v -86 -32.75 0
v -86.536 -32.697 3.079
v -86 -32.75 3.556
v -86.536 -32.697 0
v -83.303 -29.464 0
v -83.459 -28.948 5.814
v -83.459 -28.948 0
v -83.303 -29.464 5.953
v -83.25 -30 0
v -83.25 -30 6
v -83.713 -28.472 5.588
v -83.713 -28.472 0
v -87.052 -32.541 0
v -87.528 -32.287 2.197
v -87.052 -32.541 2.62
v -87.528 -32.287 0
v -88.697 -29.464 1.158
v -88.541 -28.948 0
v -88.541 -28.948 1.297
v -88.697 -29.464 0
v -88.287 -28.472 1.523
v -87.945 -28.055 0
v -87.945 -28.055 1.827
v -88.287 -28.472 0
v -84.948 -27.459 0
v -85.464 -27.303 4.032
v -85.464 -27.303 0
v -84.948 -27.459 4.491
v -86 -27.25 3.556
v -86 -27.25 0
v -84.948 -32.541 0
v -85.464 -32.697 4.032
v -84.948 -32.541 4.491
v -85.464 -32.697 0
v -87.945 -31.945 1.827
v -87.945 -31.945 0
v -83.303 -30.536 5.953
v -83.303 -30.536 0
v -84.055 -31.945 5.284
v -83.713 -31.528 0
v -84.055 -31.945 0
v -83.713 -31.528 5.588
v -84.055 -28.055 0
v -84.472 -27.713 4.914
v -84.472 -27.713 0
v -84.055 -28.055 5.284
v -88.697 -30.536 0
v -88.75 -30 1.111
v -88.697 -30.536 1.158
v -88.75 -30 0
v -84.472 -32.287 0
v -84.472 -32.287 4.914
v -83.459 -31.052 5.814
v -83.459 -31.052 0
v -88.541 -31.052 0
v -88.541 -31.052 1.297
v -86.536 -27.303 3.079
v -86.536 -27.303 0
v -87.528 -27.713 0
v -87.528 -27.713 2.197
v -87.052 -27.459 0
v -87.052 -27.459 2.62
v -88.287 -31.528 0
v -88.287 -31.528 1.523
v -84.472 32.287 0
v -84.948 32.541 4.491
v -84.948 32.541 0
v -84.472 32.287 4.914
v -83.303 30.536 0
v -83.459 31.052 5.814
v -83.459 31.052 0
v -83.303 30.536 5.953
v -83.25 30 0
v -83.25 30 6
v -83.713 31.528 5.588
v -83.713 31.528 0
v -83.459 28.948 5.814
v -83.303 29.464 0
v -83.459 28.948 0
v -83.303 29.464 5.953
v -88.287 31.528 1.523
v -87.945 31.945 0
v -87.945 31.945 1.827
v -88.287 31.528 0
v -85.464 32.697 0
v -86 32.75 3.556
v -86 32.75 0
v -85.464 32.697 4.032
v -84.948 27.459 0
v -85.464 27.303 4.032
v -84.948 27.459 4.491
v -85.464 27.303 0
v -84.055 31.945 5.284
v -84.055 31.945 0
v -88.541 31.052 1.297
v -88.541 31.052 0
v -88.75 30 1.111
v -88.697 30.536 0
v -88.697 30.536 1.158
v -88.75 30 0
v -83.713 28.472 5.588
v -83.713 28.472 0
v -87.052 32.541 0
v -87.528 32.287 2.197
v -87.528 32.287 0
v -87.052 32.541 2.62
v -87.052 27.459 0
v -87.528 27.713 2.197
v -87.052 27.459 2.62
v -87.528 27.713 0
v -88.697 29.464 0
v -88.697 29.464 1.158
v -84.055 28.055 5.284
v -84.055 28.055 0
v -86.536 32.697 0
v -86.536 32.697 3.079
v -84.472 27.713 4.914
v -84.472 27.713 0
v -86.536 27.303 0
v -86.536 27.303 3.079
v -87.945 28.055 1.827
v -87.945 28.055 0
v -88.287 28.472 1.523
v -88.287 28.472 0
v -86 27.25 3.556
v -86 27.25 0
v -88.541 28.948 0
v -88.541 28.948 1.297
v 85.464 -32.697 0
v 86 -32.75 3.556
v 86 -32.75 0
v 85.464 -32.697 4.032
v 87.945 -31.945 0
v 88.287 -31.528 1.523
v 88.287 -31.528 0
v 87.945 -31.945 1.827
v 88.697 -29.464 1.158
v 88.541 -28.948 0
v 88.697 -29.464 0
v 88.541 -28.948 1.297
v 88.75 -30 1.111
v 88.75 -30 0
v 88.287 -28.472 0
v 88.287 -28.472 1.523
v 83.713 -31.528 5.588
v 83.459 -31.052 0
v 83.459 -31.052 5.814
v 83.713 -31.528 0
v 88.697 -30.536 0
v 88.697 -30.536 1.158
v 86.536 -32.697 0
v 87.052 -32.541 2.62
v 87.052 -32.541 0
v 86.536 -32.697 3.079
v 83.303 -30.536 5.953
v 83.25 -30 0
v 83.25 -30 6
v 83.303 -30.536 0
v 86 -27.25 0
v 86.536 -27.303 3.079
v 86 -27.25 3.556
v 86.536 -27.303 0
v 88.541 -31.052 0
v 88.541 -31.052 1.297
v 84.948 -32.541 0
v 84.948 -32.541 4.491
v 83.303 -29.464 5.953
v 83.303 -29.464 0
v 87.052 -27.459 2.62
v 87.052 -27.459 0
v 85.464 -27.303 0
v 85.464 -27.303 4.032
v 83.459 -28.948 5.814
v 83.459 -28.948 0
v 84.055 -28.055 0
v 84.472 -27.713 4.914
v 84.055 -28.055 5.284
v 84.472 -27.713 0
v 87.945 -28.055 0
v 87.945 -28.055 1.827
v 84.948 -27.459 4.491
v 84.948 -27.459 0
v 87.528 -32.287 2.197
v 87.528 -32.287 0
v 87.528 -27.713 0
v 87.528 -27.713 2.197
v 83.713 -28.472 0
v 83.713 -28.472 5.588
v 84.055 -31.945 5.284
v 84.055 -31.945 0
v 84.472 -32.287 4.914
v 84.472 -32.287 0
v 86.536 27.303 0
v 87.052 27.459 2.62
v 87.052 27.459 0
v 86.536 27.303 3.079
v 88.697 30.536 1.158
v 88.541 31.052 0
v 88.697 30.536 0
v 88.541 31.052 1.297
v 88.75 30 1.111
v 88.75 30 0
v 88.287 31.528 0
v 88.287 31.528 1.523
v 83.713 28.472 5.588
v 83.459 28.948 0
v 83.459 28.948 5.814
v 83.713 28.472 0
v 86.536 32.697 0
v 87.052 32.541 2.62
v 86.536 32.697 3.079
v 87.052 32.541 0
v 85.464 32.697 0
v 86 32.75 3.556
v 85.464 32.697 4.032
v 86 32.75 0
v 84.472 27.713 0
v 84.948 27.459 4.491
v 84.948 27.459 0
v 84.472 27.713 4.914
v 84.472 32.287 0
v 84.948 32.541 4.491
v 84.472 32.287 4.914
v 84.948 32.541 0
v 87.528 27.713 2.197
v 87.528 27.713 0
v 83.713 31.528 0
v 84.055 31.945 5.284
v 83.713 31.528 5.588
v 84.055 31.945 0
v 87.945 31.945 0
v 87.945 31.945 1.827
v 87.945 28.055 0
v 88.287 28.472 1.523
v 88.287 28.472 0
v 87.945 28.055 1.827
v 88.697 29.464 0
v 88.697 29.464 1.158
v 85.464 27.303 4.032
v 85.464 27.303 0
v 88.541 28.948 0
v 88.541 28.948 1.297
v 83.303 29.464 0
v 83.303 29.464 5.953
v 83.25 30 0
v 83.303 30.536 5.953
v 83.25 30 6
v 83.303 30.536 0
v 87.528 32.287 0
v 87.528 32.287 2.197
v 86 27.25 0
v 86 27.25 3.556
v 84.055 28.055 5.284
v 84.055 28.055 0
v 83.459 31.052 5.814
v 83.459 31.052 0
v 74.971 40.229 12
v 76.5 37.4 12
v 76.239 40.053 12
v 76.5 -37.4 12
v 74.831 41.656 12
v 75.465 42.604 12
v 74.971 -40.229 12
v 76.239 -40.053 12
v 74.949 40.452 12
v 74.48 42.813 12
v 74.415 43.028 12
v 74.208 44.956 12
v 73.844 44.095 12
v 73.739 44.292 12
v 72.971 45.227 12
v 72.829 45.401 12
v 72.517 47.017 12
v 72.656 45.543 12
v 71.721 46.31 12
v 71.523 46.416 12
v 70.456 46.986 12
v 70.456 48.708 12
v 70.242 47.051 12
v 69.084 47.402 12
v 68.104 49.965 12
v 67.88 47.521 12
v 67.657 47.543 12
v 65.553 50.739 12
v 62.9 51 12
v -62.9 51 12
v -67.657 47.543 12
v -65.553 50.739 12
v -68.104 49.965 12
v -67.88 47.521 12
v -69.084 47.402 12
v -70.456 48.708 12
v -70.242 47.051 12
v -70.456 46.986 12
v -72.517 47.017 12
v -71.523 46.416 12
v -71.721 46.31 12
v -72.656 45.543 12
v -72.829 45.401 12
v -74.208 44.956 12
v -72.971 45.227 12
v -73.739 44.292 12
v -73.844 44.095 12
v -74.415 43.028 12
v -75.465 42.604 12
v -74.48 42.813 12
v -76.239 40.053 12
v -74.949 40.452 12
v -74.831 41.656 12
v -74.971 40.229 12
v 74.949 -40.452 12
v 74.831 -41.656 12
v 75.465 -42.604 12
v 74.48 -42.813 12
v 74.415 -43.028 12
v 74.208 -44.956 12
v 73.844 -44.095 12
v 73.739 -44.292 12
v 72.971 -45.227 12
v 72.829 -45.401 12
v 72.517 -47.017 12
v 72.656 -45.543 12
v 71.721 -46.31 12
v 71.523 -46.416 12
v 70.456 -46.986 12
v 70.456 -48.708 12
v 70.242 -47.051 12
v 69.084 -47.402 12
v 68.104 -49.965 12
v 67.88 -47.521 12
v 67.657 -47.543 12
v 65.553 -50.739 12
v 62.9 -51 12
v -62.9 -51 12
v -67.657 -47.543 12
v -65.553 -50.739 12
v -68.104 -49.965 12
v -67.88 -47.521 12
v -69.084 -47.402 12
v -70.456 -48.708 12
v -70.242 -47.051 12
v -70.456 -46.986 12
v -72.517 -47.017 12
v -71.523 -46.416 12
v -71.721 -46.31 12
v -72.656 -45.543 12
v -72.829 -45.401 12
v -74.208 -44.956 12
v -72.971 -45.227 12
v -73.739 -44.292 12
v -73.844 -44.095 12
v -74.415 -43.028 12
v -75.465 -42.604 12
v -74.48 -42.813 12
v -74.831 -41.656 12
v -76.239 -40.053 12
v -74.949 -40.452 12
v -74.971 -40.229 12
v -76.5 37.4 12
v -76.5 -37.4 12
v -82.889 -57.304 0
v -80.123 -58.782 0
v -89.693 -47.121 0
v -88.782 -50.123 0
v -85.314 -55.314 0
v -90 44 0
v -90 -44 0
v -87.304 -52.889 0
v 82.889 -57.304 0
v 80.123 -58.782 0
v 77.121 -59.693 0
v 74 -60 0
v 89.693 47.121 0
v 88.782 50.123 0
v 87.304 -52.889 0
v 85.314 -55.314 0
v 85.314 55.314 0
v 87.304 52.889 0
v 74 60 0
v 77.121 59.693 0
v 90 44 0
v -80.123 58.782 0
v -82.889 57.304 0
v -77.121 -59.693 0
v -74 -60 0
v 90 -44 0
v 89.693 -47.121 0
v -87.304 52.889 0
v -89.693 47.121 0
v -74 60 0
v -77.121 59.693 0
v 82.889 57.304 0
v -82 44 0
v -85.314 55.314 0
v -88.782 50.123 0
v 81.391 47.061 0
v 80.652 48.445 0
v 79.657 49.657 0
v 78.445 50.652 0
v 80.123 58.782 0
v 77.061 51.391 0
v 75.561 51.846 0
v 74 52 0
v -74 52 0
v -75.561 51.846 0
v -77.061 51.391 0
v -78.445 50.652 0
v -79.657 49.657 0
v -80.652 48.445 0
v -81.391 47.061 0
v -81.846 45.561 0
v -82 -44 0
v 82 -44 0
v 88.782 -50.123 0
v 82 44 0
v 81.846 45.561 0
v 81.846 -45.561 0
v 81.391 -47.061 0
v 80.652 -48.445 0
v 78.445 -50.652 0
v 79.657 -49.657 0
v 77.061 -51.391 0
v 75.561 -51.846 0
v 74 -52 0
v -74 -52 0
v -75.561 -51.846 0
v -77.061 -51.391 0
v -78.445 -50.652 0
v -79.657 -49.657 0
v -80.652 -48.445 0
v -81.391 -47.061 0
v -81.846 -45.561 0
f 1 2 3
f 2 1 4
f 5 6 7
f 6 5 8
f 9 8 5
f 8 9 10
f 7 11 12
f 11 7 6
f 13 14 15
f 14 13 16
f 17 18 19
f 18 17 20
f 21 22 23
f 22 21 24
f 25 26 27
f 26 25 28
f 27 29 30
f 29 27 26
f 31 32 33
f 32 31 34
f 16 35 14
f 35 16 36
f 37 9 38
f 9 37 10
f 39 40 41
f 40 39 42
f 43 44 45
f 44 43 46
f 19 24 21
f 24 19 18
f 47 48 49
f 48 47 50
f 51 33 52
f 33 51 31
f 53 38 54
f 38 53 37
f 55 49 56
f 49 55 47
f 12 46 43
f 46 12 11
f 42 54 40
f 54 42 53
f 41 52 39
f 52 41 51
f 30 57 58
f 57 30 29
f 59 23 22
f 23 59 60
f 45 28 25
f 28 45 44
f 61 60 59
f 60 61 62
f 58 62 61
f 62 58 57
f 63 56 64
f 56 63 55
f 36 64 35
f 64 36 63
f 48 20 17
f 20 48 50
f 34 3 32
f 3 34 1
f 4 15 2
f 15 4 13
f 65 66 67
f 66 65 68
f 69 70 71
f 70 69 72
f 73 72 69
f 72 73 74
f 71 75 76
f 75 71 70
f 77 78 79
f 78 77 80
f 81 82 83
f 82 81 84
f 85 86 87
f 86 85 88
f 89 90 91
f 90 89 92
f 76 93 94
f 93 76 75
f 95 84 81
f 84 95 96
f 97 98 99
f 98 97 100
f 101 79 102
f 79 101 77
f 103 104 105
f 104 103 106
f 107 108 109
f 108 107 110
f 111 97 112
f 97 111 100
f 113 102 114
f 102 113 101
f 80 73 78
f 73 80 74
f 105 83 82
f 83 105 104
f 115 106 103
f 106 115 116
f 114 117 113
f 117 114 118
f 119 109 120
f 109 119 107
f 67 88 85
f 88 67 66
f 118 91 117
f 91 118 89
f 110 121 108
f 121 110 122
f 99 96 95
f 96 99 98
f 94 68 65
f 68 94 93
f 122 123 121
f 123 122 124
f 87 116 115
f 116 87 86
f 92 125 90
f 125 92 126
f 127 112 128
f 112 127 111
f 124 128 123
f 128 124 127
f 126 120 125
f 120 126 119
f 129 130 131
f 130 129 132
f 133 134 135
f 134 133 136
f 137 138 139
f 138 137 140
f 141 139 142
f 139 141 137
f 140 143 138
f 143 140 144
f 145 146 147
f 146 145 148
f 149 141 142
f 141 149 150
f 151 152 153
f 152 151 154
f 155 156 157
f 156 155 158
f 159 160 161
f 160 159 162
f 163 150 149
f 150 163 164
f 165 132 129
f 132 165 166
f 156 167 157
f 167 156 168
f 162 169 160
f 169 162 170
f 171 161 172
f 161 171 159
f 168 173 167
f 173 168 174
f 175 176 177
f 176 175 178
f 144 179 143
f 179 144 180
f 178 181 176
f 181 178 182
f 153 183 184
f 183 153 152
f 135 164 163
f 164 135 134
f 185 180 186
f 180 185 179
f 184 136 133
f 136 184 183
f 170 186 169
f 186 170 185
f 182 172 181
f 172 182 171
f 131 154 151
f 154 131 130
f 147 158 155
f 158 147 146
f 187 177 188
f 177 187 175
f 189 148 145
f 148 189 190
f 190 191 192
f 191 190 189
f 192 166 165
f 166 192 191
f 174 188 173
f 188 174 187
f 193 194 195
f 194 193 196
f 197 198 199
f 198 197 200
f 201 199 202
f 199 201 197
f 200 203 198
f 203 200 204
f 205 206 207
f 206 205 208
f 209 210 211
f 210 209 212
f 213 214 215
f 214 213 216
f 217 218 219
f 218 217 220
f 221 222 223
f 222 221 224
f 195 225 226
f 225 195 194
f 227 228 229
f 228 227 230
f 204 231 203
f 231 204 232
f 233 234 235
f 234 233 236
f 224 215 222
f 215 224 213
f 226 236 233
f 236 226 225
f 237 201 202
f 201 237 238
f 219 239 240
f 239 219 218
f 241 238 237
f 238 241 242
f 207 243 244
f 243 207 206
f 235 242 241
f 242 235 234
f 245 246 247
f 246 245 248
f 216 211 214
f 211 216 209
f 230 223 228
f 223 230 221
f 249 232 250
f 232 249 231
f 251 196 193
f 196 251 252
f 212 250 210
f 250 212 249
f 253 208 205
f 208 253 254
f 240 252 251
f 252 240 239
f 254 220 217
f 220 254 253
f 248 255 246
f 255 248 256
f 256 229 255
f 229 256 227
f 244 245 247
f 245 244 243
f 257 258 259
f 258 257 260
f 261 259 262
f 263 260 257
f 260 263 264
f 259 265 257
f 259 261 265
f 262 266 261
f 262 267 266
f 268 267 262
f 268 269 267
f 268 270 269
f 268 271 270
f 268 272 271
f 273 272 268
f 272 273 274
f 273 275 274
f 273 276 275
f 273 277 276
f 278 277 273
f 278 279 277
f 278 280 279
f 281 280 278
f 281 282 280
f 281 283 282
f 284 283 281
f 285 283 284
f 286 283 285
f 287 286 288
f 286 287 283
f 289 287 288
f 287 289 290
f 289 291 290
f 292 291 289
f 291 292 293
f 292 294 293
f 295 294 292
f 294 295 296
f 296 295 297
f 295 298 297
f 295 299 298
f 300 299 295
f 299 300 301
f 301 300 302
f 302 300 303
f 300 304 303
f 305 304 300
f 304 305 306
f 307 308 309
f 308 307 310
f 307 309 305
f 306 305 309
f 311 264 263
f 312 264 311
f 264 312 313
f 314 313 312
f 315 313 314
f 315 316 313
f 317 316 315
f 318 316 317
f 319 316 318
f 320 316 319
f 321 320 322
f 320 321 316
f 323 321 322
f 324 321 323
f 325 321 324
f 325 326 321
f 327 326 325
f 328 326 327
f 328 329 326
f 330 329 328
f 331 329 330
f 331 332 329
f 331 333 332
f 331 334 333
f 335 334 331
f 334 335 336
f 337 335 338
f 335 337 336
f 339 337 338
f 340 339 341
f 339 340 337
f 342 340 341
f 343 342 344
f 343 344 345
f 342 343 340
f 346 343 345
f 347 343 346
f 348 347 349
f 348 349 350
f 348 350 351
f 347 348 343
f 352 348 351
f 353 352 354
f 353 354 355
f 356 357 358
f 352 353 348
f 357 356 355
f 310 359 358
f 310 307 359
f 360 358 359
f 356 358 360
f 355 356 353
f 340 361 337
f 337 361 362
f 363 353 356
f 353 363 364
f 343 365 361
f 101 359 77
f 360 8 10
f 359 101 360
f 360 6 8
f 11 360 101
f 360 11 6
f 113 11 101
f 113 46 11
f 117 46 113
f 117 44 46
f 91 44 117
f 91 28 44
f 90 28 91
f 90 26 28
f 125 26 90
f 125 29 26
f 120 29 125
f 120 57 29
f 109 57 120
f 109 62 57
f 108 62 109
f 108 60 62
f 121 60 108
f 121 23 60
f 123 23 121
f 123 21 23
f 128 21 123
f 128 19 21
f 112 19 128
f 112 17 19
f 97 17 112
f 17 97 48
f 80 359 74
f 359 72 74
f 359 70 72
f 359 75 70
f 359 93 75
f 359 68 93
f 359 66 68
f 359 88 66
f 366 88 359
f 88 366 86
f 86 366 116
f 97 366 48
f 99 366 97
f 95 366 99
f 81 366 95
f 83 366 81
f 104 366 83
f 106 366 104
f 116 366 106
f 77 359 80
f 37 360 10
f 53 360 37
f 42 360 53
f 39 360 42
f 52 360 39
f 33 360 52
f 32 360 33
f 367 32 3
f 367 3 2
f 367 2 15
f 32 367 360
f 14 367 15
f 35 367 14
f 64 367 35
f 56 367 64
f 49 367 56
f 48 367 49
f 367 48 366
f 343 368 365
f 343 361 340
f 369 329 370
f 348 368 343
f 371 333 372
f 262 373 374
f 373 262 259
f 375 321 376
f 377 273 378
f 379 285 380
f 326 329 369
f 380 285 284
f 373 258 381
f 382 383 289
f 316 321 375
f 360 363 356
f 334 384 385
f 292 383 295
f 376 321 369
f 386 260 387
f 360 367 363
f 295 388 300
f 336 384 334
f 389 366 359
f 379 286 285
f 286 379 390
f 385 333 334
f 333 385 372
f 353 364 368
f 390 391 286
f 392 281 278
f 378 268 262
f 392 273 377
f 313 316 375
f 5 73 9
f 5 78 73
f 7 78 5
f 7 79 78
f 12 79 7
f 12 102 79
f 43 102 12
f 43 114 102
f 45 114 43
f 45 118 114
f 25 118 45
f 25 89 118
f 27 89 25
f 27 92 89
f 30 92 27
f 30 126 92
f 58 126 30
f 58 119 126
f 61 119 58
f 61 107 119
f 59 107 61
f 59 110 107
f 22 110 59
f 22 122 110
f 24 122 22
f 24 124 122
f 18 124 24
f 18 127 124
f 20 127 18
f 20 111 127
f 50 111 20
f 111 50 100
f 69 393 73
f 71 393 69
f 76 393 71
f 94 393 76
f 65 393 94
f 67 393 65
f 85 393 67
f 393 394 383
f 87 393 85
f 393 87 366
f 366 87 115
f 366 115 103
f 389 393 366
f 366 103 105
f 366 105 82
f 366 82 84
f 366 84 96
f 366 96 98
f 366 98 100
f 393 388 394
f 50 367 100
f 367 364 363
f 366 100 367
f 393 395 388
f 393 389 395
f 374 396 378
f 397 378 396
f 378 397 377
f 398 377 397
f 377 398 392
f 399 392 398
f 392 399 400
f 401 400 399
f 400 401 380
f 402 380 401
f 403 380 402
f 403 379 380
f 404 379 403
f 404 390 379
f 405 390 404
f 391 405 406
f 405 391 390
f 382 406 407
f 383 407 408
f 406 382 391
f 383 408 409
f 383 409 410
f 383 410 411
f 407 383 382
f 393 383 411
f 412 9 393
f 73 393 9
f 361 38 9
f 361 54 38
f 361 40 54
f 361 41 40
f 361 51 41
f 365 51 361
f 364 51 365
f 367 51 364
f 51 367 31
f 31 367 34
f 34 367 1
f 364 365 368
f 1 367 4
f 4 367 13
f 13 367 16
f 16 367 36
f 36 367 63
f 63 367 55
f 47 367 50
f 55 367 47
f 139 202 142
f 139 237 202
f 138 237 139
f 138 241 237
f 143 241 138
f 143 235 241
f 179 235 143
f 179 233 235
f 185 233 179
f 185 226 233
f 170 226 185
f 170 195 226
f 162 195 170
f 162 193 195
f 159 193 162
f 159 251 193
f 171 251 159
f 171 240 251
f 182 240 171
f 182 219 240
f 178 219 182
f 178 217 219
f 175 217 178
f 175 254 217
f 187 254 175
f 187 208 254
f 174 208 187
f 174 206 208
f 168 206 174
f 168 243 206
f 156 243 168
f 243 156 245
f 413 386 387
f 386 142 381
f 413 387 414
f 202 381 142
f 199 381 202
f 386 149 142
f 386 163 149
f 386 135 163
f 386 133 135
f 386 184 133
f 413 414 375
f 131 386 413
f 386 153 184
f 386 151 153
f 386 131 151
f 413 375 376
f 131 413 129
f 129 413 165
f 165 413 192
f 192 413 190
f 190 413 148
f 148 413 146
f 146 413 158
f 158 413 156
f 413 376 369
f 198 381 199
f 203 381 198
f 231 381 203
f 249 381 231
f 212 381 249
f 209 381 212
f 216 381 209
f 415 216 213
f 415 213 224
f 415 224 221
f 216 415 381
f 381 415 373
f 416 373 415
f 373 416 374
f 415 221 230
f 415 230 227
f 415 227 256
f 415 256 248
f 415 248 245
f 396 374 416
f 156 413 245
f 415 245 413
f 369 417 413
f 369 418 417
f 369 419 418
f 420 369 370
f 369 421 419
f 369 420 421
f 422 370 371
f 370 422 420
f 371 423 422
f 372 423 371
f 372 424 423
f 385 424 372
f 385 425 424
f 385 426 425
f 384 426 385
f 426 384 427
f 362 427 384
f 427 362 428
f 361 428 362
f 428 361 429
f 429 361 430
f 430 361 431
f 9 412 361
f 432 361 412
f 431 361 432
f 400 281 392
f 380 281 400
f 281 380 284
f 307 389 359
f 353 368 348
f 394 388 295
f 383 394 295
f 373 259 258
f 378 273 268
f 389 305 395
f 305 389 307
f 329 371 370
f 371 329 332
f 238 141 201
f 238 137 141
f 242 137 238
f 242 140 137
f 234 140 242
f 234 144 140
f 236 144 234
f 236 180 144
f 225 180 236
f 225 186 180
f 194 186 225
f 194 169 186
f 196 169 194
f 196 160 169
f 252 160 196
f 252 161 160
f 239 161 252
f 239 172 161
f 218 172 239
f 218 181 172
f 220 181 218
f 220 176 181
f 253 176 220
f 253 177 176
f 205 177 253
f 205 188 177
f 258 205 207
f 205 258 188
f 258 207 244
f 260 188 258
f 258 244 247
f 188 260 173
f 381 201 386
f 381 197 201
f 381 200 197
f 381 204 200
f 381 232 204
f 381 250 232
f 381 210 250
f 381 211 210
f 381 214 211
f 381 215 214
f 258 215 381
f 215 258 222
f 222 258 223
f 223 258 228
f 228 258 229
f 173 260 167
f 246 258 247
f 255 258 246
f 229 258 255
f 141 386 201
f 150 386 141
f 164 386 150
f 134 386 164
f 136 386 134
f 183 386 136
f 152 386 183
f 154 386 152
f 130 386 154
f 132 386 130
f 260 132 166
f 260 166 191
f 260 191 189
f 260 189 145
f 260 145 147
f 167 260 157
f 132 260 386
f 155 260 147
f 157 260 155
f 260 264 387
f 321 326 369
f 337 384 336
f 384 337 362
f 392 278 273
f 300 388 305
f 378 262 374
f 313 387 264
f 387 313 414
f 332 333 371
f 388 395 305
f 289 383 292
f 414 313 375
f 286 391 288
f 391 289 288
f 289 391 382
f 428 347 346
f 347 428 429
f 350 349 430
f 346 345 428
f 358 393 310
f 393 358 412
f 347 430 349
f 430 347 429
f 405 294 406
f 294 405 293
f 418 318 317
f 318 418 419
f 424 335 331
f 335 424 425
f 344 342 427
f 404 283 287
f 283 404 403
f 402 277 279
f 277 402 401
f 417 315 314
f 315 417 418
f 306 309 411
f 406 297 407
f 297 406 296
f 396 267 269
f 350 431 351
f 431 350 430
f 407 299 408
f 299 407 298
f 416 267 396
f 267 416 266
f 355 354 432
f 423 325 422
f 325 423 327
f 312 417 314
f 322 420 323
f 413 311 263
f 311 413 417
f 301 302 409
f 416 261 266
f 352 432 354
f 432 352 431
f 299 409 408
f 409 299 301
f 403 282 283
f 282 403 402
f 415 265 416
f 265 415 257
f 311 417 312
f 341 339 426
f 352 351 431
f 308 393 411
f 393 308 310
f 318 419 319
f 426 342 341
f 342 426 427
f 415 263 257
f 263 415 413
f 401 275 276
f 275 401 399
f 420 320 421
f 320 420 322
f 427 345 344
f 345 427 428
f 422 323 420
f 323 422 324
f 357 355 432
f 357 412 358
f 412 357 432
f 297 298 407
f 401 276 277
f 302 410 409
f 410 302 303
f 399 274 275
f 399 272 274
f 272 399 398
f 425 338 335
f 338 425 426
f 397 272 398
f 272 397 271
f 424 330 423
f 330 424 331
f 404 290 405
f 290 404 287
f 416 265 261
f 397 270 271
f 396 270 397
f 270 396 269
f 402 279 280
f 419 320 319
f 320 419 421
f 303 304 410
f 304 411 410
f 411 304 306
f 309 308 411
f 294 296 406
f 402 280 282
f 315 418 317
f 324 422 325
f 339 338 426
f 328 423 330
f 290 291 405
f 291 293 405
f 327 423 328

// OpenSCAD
$fn = 32;

// ----------------------------------------------------------------------
// Display bezel: 180 x 120 mm frame, opening 164x104 mm
// ----------------------------------------------------------------------

// --- parameters (mm) ---
length = 180;             // frame outside length, X
width = 120;              // frame outside width, Y
frame_w = 8;              // frame width
thickness = 12;           // frame thickness
corner_r = 16;            // outside corner radius
chamfer = 0.85;           // outer wall taper
funnel = 0.9;             // inner opening taper
opening_l = 164;          // opening length
opening_w = 104;          // opening width
inner_r = 8;              // opening corner radius
hole_d = 5.5;             // mounting screw clearance
holes_per_side = 2;       // holes per short side
hole_inset = 4;           // hole centre inset from the outside edge

/* rounded-rectangle outlines, generated with loops */
module rounded_ring(l_nom, w_nom, r) {
  hull() {
    for (sx = [-1, 1]) for (sy = [-1, 1])
      translate([sx * (l_nom / 2 - r), sy * (w_nom / 2 - r)]) circle(r = r);
  }
}

difference() {
  /* frame body, drafted so the outer edge is a variable-depth chamfer */
  linear_extrude(height = thickness, scale = chamfer)
    rounded_ring(length, width, corner_r);
  /* viewing opening, drafted the other way for a funnel edge */
  linear_extrude(height = thickness + 2, scale = funnel)
    translate([0, 0, -1]) rounded_ring(opening_l, opening_w, inner_r);
  /* mounting screws through the frame lands */
  for (sx = [-1, 1]) for (i = [1 : holes_per_side])
    translate([sx * (length / 2 - hole_inset),
               (i - (holes_per_side + 1) / 2) * width * 0.5, -1])
      cylinder(h = thickness + 2, d = hole_d);
}
